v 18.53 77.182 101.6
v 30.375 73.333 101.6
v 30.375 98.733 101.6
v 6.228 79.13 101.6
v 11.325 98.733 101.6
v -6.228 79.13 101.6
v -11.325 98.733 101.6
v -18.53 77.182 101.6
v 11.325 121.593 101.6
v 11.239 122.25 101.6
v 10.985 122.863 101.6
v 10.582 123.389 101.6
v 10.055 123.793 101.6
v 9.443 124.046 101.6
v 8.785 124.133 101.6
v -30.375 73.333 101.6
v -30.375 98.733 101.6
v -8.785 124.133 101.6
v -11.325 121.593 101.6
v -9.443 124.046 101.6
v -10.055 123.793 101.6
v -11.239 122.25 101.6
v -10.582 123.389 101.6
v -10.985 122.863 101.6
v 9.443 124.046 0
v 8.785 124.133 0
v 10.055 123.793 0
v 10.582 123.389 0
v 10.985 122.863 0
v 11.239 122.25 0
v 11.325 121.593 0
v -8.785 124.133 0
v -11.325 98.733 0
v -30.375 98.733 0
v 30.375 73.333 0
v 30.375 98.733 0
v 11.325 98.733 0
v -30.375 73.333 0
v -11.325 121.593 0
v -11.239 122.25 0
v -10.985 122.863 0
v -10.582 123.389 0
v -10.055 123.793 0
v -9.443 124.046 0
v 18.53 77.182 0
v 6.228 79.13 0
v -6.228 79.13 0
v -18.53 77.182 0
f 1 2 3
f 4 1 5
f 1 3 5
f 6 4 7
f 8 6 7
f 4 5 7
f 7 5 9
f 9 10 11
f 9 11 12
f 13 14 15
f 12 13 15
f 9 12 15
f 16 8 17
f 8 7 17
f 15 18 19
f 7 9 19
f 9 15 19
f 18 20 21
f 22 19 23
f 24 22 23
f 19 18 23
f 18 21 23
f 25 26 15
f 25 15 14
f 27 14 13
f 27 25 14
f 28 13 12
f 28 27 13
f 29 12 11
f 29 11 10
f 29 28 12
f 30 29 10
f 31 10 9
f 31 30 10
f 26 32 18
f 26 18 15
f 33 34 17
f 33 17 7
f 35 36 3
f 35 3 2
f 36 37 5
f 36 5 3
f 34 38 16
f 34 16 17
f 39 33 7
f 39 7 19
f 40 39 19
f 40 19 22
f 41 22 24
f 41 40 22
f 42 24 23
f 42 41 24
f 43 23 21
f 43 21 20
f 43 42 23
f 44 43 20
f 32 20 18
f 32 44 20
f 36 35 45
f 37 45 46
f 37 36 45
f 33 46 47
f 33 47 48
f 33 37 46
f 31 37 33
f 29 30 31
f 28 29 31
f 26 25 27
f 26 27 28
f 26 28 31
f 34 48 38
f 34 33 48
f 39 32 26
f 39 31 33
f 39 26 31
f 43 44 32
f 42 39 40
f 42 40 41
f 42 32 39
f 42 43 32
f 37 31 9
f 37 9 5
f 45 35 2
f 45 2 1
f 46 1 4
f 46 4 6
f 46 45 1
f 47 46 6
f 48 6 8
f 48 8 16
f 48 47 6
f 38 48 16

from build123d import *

# Parameters (mm, degrees)
BOSS_EXTRUDE2_DEPTH = 101.6


with BuildPart() as part:
    # Sketch1 → Boss-Extrude2 (new body)
    with BuildSketch(Plane.XY):
        with BuildLine():
            Line((-30.375497444, 98.732937893), (-11.325497444, 98.732937893))
            Line((-11.325497444, 98.732937893), (-11.325497444, 121.592937893))
            ThreePointArc((-11.325497444, 121.592937893), (-10.581548668, 123.388989117), (-8.785497444, 124.132937893))
            Line((-8.785497444, 124.132937893), (8.785497444, 124.132937893))
            ThreePointArc((8.785497444, 124.132937893), (10.581548668, 123.388989117), (11.325497444, 121.592937893))
            Line((11.325497444, 121.592937893), (11.325497444, 98.732937893))
            Line((11.325497444, 98.732937893), (30.375497444, 98.732937893))
            Line((30.375497444, 98.732937893), (30.375497444, 73.332937893))
            ThreePointArc((30.375497444, 73.332937893), (0, 79.375), (-30.375497444, 73.332937893))
            Line((-30.375497444, 73.332937893), (-30.375497444, 98.732937893))
        make_face()
    extrude(amount=BOSS_EXTRUDE2_DEPTH)


solid = part.part
